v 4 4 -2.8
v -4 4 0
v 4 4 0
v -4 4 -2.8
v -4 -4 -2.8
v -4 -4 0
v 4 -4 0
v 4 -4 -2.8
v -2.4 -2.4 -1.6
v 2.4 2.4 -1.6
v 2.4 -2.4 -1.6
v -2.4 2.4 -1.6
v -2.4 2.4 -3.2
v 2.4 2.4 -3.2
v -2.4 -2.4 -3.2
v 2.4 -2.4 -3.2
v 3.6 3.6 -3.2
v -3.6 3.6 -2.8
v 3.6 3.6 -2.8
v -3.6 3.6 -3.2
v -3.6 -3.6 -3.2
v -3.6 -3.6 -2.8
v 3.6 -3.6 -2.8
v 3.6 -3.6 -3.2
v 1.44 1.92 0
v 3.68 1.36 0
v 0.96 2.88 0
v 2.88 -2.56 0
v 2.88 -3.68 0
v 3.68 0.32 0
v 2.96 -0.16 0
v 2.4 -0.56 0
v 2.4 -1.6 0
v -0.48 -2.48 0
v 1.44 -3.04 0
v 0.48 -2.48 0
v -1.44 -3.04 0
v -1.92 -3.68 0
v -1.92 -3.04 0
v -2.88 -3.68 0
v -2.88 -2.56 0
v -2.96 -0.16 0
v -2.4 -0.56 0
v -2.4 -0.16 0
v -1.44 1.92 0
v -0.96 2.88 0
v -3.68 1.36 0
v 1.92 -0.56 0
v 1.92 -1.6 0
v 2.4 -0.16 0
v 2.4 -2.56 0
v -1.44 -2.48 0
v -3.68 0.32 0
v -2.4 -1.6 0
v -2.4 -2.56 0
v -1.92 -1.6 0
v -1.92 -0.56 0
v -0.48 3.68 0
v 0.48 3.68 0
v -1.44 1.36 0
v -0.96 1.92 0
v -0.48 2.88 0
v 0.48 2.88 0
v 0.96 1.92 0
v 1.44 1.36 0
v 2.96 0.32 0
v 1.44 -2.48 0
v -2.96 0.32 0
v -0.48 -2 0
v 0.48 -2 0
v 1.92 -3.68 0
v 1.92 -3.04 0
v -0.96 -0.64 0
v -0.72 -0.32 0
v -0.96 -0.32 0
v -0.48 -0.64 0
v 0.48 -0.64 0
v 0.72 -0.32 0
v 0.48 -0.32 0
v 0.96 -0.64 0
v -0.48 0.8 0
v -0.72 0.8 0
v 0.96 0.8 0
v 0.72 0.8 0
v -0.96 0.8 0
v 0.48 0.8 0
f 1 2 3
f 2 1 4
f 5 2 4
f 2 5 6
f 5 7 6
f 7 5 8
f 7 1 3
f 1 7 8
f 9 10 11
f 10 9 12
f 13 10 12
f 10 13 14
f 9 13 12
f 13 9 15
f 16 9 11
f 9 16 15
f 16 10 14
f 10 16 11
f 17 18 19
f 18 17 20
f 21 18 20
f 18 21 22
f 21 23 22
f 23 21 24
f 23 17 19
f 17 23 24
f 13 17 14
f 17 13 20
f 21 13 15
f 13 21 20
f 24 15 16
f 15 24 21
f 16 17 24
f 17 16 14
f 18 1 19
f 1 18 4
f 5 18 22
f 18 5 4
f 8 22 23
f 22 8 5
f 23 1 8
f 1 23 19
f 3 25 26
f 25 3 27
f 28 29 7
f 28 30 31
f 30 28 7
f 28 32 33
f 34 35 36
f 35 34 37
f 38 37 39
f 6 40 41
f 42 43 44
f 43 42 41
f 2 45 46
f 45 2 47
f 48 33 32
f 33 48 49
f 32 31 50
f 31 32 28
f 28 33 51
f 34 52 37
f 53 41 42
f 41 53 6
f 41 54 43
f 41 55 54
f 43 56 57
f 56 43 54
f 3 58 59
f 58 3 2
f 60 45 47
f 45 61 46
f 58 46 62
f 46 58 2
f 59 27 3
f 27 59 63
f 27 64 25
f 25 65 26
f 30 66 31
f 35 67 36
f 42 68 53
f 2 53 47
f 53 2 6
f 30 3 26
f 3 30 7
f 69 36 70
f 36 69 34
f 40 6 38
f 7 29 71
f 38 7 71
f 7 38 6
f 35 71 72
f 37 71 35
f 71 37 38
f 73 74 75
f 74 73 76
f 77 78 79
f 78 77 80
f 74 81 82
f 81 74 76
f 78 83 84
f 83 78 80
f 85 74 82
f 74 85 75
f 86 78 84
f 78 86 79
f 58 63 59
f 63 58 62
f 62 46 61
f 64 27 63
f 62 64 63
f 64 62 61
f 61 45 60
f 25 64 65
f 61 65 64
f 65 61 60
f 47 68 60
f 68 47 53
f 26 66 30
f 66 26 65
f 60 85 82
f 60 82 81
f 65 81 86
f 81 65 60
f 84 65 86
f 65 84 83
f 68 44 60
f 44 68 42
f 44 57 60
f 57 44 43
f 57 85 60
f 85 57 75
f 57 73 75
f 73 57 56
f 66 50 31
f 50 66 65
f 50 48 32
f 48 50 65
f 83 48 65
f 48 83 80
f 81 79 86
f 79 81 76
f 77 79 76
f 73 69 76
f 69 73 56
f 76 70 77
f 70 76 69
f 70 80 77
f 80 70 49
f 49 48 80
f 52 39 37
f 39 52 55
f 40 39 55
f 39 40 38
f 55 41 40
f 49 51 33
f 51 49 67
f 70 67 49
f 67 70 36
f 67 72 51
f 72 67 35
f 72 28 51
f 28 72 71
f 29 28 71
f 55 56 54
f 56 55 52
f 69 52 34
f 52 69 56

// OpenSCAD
// file: ../p/box5.scad
use <../lib.scad>
function ldraw_lib__box5() = [
// 0 Box with 5 Faces and All Edges
// 0 Name: box5.dat
// 0 Author: James Jessiman
// 0 !LDRAW_ORG Primitive UPDATE 2012-01
// 0 !LICENSE Licensed under CC BY 4.0 : see CAreadme.txt
// 
// 0 BFC CERTIFY CCW
  [0,"BFC","CERTIFY"],
  [0,"BFC","CCW"],
// 
// 0 !HISTORY 2002-04-03 [sbliss] Modified for BFC compliance
// 0 !HISTORY 2002-04-25 [PTadmin] Official Update 2002-02
// 0 !HISTORY 2007-06-24 [PTadmin] Header formatted for Contributor Agreement
// 0 !HISTORY 2008-07-01 [PTadmin] Official Update 2008-01
// 0 !HISTORY 2012-02-16 [Philo] Changed to CCW
// 0 !HISTORY 2012-03-30 [PTadmin] Official Update 2012-01
// 
// 
// 2 24 1 1 1 -1 1 1
  [2,24,1,1,1,-1,1,1],
// 2 24 -1 1 1 -1 1 -1
  [2,24,-1,1,1,-1,1,-1],
// 2 24 -1 1 -1 1 1 -1
  [2,24,-1,1,-1,1,1,-1],
// 2 24 1 1 -1 1 1 1
  [2,24,1,1,-1,1,1,1],
// 2 24 1 0 1 -1 0 1
  [2,24,1,0,1,-1,0,1],
// 2 24 -1 0 1 -1 0 -1
  [2,24,-1,0,1,-1,0,-1],
// 2 24 -1 0 -1 1 0 -1
  [2,24,-1,0,-1,1,0,-1],
// 2 24 1 0 -1 1 0 1
  [2,24,1,0,-1,1,0,1],
// 2 24 1 0 1 1 1 1
  [2,24,1,0,1,1,1,1],
// 2 24 -1 0 1 -1 1 1
  [2,24,-1,0,1,-1,1,1],
// 2 24 1 0 -1 1 1 -1
  [2,24,1,0,-1,1,1,-1],
// 2 24 -1 0 -1 -1 1 -1
  [2,24,-1,0,-1,-1,1,-1],
// 4 16 -1 1 1 1 1 1 1 1 -1 -1 1 -1
  [4,16,-1,1,1,1,1,1,1,1,-1,-1,1,-1],
// 4 16 -1 1 1 -1 0 1 1 0 1 1 1 1
  [4,16,-1,1,1,-1,0,1,1,0,1,1,1,1],
// 4 16 -1 1 -1 -1 0 -1 -1 0 1 -1 1 1
  [4,16,-1,1,-1,-1,0,-1,-1,0,1,-1,1,1],
// 4 16 1 1 -1 1 0 -1 -1 0 -1 -1 1 -1
  [4,16,1,1,-1,1,0,-1,-1,0,-1,-1,1,-1],
// 4 16 1 1 1 1 0 1 1 0 -1 1 1 -1
  [4,16,1,1,1,1,0,1,1,0,-1,1,1,-1],
];
module ldraw_lib__box5(step=0, col=false, unit=2/5, alt=false, line=0.2, solid=!$preview)
    makepoly(ldraw_lib__box5(), step=step, col=col, unit=unit, alt=alt, line=line, solid=solid);
ldraw_lib__box5(line=0.2);
// file: ../p/box4.scad
use <../lib.scad>
function ldraw_lib__box4() = [
// 0 Box with 4 Faces (2 Parallel Pairs) and All Edges
// 0 Name: box4.dat
// 0 Author: James Jessiman
// 0 !LDRAW_ORG Primitive UPDATE 2012-01
// 0 !LICENSE Licensed under CC BY 4.0 : see CAreadme.txt
// 
// 0 BFC CERTIFY CCW
  [0,"BFC","CERTIFY"],
  [0,"BFC","CCW"],
// 
// 0 !HISTORY 2002-04-03 [sbliss] Modified for BFC compliance
// 0 !HISTORY 2002-04-25 [PTadmin] Official Update 2002-02
// 0 !HISTORY 2007-06-24 [PTadmin] Header formatted for Contributor Agreement
// 0 !HISTORY 2008-07-01 [PTadmin] Official Update 2008-01
// 0 !HISTORY 2012-02-16 [Philo] Changed to CCW
// 0 !HISTORY 2012-03-30 [PTadmin] Official Update 2012-01
// 
// 
// 2 24 1 1 1 -1 1 1
  [2,24,1,1,1,-1,1,1],
// 2 24 -1 1 1 -1 1 -1
  [2,24,-1,1,1,-1,1,-1],
// 2 24 -1 1 -1 1 1 -1
  [2,24,-1,1,-1,1,1,-1],
// 2 24 1 1 -1 1 1 1
  [2,24,1,1,-1,1,1,1],
// 2 24 1 0 1 -1 0 1
  [2,24,1,0,1,-1,0,1],
// 2 24 -1 0 1 -1 0 -1
  [2,24,-1,0,1,-1,0,-1],
// 2 24 -1 0 -1 1 0 -1
  [2,24,-1,0,-1,1,0,-1],
// 2 24 1 0 -1 1 0 1
  [2,24,1,0,-1,1,0,1],
// 2 24 1 0 1 1 1 1
  [2,24,1,0,1,1,1,1],
// 2 24 -1 0 1 -1 1 1
  [2,24,-1,0,1,-1,1,1],
// 2 24 1 0 -1 1 1 -1
  [2,24,1,0,-1,1,1,-1],
// 2 24 -1 0 -1 -1 1 -1
  [2,24,-1,0,-1,-1,1,-1],
// 4 16 -1 1 1 -1 0 1 1 0 1 1 1 1
  [4,16,-1,1,1,-1,0,1,1,0,1,1,1,1],
// 4 16 -1 1 -1 -1 0 -1 -1 0 1 -1 1 1
  [4,16,-1,1,-1,-1,0,-1,-1,0,1,-1,1,1],
// 4 16 1 1 -1 1 0 -1 -1 0 -1 -1 1 -1
  [4,16,1,1,-1,1,0,-1,-1,0,-1,-1,1,-1],
// 4 16 1 1 1 1 0 1 1 0 -1 1 1 -1
  [4,16,1,1,1,1,0,1,1,0,-1,1,1,-1],
];
module ldraw_lib__box4(step=0, col=false, unit=2/5, alt=false, line=0.2, solid=!$preview)
    makepoly(ldraw_lib__box4(), step=step, col=col, unit=unit, alt=alt, line=line, solid=solid);
ldraw_lib__box4(line=0.2);
// file: s/3070bs01.scad
use <../../lib.scad>
use <../../p/box4.scad>
use <../../p/box5.scad>
function ldraw_lib__s__3070bs01() = [
// 0 ~Tile  1 x  1 with Groove without Top Face
// 0 Name: s\3070bs01.dat
// 0 Author: Chris Dee [cwdee]
// 0 !LDRAW_ORG Subpart UPDATE 2009-02
// 0 !LICENSE Licensed under CC BY 4.0 : see CAreadme.txt
// 
// 0 BFC CERTIFY CCW
  [0,"BFC","CERTIFY"],
  [0,"BFC","CCW"],
// 
// 0 !HISTORY 2009-09-03 [PTadmin] Official Update 2009-02
// 
// 
// 1 16 0 0 0 10 0 0 0 7 0 0 0 10 box4.dat
  [1,16,0,0,0,10,0,0,0,7,0,0,0,10, ldraw_lib__box4()],
// 0 BFC INVERTNEXT
  [0,"BFC","INVERTNEXT"],
// 1 16 0 8 0 6 0 0 0 -4 0 0 0 6 box5.dat
  [1,16,0,8,0,6,0,0,0,-4,0,0,0,6, ldraw_lib__box5()],
// 1 16 0 7 0 9 0 0 0 1 0 0 0 9 box4.dat
  [1,16,0,7,0,9,0,0,0,1,0,0,0,9, ldraw_lib__box4()],
// 
// 4 16 9 8 9 6 8 6 -6 8 6 -9 8 9
  [4,16,9,8,9,6,8,6,-6,8,6,-9,8,9],
// 4 16 -9 8 9 -6 8 6 -6 8 -6 -9 8 -9
  [4,16,-9,8,9,-6,8,6,-6,8,-6,-9,8,-9],
// 4 16 -9 8 -9 -6 8 -6 6 8 -6 9 8 -9
  [4,16,-9,8,-9,-6,8,-6,6,8,-6,9,8,-9],
// 4 16 9 8 -9 6 8 -6 6 8 6 9 8 9
  [4,16,9,8,-9,6,8,-6,6,8,6,9,8,9],
// 
// 4 16 10 7 10 9 7 9 -9 7 9 -10 7 10
  [4,16,10,7,10,9,7,9,-9,7,9,-10,7,10],
// 4 16 -10 7 10 -9 7 9 -9 7 -9 -10 7 -10
  [4,16,-10,7,10,-9,7,9,-9,7,-9,-10,7,-10],
// 4 16 -10 7 -10 -9 7 -9 9 7 -9 10 7 -10
  [4,16,-10,7,-10,-9,7,-9,9,7,-9,10,7,-10],
// 4 16 10 7 -10 9 7 -9 9 7 9 10 7 10
  [4,16,10,7,-10,9,7,-9,9,7,9,10,7,10],
// 0
];
module ldraw_lib__s__3070bs01(step=0, col=false, unit=2/5, alt=false, line=0.2, solid=!$preview)
    makepoly(ldraw_lib__s__3070bs01(), step=step, col=col, unit=unit, alt=alt, line=line, solid=solid);
ldraw_lib__s__3070bs01(line=0.2);
// main file
use <../lib.scad>
use <s/3070bs01.scad>
function ldraw_lib__3070bp1m() = [
// 0 Tile  1 x  1 with Super Mario Pixelated Super Star Pattern
// 0 Name: 3070bp1m.dat
// 0 Author: Florent Faramond [Makou]
// 0 !LDRAW_ORG Part UPDATE 2025-10
// 0 !LICENSE Licensed under CC BY 4.0 : see CAreadme.txt
// 
// 0 BFC CERTIFY CCW
  [0,"BFC","CERTIFY"],
  [0,"BFC","CCW"],
// 
// 0 !KEYWORDS BrickLink 3070pb169, Rebrickable 3070bpr0230, Set 71374
// 
// 0 !HISTORY 2025-08-04 [Cheenzo] Removed unnecessary vertices and Bright Light Blue colour, reworked the triangulation
// 0 !HISTORY 2025-10-27 [OrionP] Official Update 2025-10
// 
// 1 16 0 0 0 1 0 0 0 1 0 0 0 1 s\3070bs01.dat
  [1,16,0,0,0,1,0,0,0,1,0,0,0,1, ldraw_lib__s__3070bs01()],
// 4 16 9.2 0 3.4 10 0 10 2.4 0 7.2 3.6 0 4.8
  [4,16,9.2,0,3.4,10,0,10,2.4,0,7.2,3.6,0,4.8],
// 3 16 7.2 0 -6.4 7.2 0 -9.2 10 0 -10
  [3,16,7.2,0,-6.4,7.2,0,-9.2,10,0,-10],
// 4 16 7.4 0 -.4 7.2 0 -6.4 10 0 -10 9.2 0 .8
  [4,16,7.4,0,-.4,7.2,0,-6.4,10,0,-10,9.2,0,.8],
// 3 16 7.2 0 -6.4 6 0 -1.4 6 0 -4
  [3,16,7.2,0,-6.4,6,0,-1.4,6,0,-4],
// 4 16 -3.6 0 -7.6 3.6 0 -7.6 1.2 0 -6.2 -1.2 0 -6.2
  [4,16,-3.6,0,-7.6,3.6,0,-7.6,1.2,0,-6.2,-1.2,0,-6.2],
// 3 16 -4.8 0 -9.2 -3.6 0 -7.6 -4.8 0 -7.6
  [3,16,-4.8,0,-9.2,-3.6,0,-7.6,-4.8,0,-7.6],
// 3 16 -10 0 -10 -7.2 0 -9.2 -7.2 0 -6.4
  [3,16,-10,0,-10,-7.2,0,-9.2,-7.2,0,-6.4],
// 4 16 -6 0 -.4 -7.4 0 -.4 -7.2 0 -6.4 -6 0 -1.4
  [4,16,-6,0,-.4,-7.4,0,-.4,-7.2,0,-6.4,-6,0,-1.4],
// 4 16 -2.4 0 7.2 -10 0 10 -9.2 0 3.4 -3.6 0 4.8
  [4,16,-2.4,0,7.2,-10,0,10,-9.2,0,3.4,-3.6,0,4.8],
// 4 16 6 0 -1.4 4.8 0 -1.4 4.8 0 -4 6 0 -4
  [4,16,6,0,-1.4,4.8,0,-1.4,4.8,0,-4,6,0,-4],
// 4 16 6 0 -.4 6 0 -1.4 7.2 0 -6.4 7.4 0 -.4
  [4,16,6,0,-.4,6,0,-1.4,7.2,0,-6.4,7.4,0,-.4],
// 3 16 7.2 0 -6.4 6 0 -4 6 0 -6.4
  [3,16,7.2,0,-6.4,6,0,-4,6,0,-6.4],
// 3 16 -1.2 0 -6.2 -3.6 0 -6.2 -3.6 0 -7.6
  [3,16,-1.2,0,-6.2,-3.6,0,-6.2,-3.6,0,-7.6],
// 4 16 -7.4 0 -.4 -9.2 0 .8 -10 0 -10 -7.2 0 -6.4
  [4,16,-7.4,0,-.4,-9.2,0,.8,-10,0,-10,-7.2,0,-6.4],
// 3 16 -7.2 0 -6.4 -6 0 -4 -6 0 -1.4
  [3,16,-7.2,0,-6.4,-6,0,-4,-6,0,-1.4],
// 3 16 -7.2 0 -6.4 -6 0 -6.4 -6 0 -4
  [3,16,-7.2,0,-6.4,-6,0,-6.4,-6,0,-4],
// 4 16 -4.8 0 -1.4 -6 0 -1.4 -6 0 -4 -4.8 0 -4
  [4,16,-4.8,0,-1.4,-6,0,-1.4,-6,0,-4,-4.8,0,-4],
// 4 16 -1.2 0 9.2 1.2 0 9.2 10 0 10 -10 0 10
  [4,16,-1.2,0,9.2,1.2,0,9.2,10,0,10,-10,0,10],
// 3 16 -3.6 0 3.4 -3.6 0 4.8 -9.2 0 3.4
  [3,16,-3.6,0,3.4,-3.6,0,4.8,-9.2,0,3.4],
// 3 16 -3.6 0 4.8 -2.4 0 4.8 -2.4 0 7.2
  [3,16,-3.6,0,4.8,-2.4,0,4.8,-2.4,0,7.2],
// 4 16 -10 0 10 -2.4 0 7.2 -1.2 0 7.2 -1.2 0 9.2
  [4,16,-10,0,10,-2.4,0,7.2,-1.2,0,7.2,-1.2,0,9.2],
// 4 16 10 0 10 1.2 0 9.2 1.2 0 7.2 2.4 0 7.2
  [4,16,10,0,10,1.2,0,9.2,1.2,0,7.2,2.4,0,7.2],
// 3 16 2.4 0 7.2 2.4 0 4.8 3.6 0 4.8
  [3,16,2.4,0,7.2,2.4,0,4.8,3.6,0,4.8],
// 3 16 3.6 0 4.8 3.6 0 3.4 9.2 0 3.4
  [3,16,3.6,0,4.8,3.6,0,3.4,9.2,0,3.4],
// 3 16 9.2 0 .8 7.4 0 .8 7.4 0 -.4
  [3,16,9.2,0,.8,7.4,0,.8,7.4,0,-.4],
// 3 16 3.6 0 -7.6 3.6 0 -6.2 1.2 0 -6.2
  [3,16,3.6,0,-7.6,3.6,0,-6.2,1.2,0,-6.2],
// 3 16 -7.4 0 -.4 -7.4 0 .8 -9.2 0 .8
  [3,16,-7.4,0,-.4,-7.4,0,.8,-9.2,0,.8],
// 4 16 -9.2 0 .8 -9.2 0 3.4 -10 0 10 -10 0 -10
  [4,16,-9.2,0,.8,-9.2,0,3.4,-10,0,10,-10,0,-10],
// 4 16 10 0 10 9.2 0 3.4 9.2 0 .8 10 0 -10
  [4,16,10,0,10,9.2,0,3.4,9.2,0,.8,10,0,-10],
// 4 16 -1.2 0 -5 -1.2 0 -6.2 1.2 0 -6.2 1.2 0 -5
  [4,16,-1.2,0,-5,-1.2,0,-6.2,1.2,0,-6.2,1.2,0,-5],
// 3 16 -7.2 0 -9.2 -10 0 -10 -4.8 0 -9.2
  [3,16,-7.2,0,-9.2,-10,0,-10,-4.8,0,-9.2],
// 3 16 10 0 -10 7.2 0 -9.2 4.8 0 -9.2
  [3,16,10,0,-10,7.2,0,-9.2,4.8,0,-9.2],
// 4 16 10 0 -10 4.8 0 -9.2 -4.8 0 -9.2 -10 0 -10
  [4,16,10,0,-10,4.8,0,-9.2,-4.8,0,-9.2,-10,0,-10],
// 3 16 3.6 0 -7.6 4.8 0 -9.2 4.8 0 -7.6
  [3,16,3.6,0,-7.6,4.8,0,-9.2,4.8,0,-7.6],
// 4 16 3.6 0 -7.6 -3.6 0 -7.6 -4.8 0 -9.2 4.8 0 -9.2
  [4,16,3.6,0,-7.6,-3.6,0,-7.6,-4.8,0,-9.2,4.8,0,-9.2],
// 4 4 -1.2 0 -1.6 -1.8 0 -.8 -2.4 0 -.8 -2.4 0 -1.6
  [4,4,-1.2,0,-1.6,-1.8,0,-.8,-2.4,0,-.8,-2.4,0,-1.6],
// 4 4 2.4 0 -1.6 1.8 0 -.8 1.2 0 -.8 1.2 0 -1.6
  [4,4,2.4,0,-1.6,1.8,0,-.8,1.2,0,-.8,1.2,0,-1.6],
// 4 4 -1.2 0 -1.6 -1.2 0 2 -1.8 0 2 -1.8 0 -.8
  [4,4,-1.2,0,-1.6,-1.2,0,2,-1.8,0,2,-1.8,0,-.8],
// 4 4 2.4 0 -1.6 2.4 0 2 1.8 0 2 1.8 0 -.8
  [4,4,2.4,0,-1.6,2.4,0,2,1.8,0,2,1.8,0,-.8],
// 4 320 -1.8 0 -.8 -1.8 0 2 -2.4 0 2 -2.4 0 -.8
  [4,320,-1.8,0,-.8,-1.8,0,2,-2.4,0,2,-2.4,0,-.8],
// 4 320 1.8 0 -.8 1.8 0 2 1.2 0 2 1.2 0 -.8
  [4,320,1.8,0,-.8,1.8,0,2,1.2,0,2,1.2,0,-.8],
// 4 78 -1.2 0 7.2 1.2 0 7.2 1.2 0 9.2 -1.2 0 9.2
  [4,78,-1.2,0,7.2,1.2,0,7.2,1.2,0,9.2,-1.2,0,9.2],
// 3 78 -1.2 0 7.2 -2.4 0 7.2 -2.4 0 4.8
  [3,78,-1.2,0,7.2,-2.4,0,7.2,-2.4,0,4.8],
// 3 78 2.4 0 4.8 2.4 0 7.2 1.2 0 7.2
  [3,78,2.4,0,4.8,2.4,0,7.2,1.2,0,7.2],
// 4 78 -1.2 0 7.2 -2.4 0 4.8 2.4 0 4.8 1.2 0 7.2
  [4,78,-1.2,0,7.2,-2.4,0,4.8,2.4,0,4.8,1.2,0,7.2],
// 3 78 -2.4 0 4.8 -3.6 0 4.8 -3.6 0 3.4
  [3,78,-2.4,0,4.8,-3.6,0,4.8,-3.6,0,3.4],
// 3 78 3.6 0 4.8 2.4 0 4.8 3.6 0 3.4
  [3,78,3.6,0,4.8,2.4,0,4.8,3.6,0,3.4],
// 4 78 3.6 0 3.4 2.4 0 4.8 -2.4 0 4.8 -3.6 0 3.4
  [4,78,3.6,0,3.4,2.4,0,4.8,-2.4,0,4.8,-3.6,0,3.4],
// 4 78 -3.6 0 3.4 -9.2 0 3.4 -9.2 0 .8 -7.4 0 .8
  [4,78,-3.6,0,3.4,-9.2,0,3.4,-9.2,0,.8,-7.4,0,.8],
// 4 78 7.4 0 .8 9.2 0 .8 9.2 0 3.4 3.6 0 3.4
  [4,78,7.4,0,.8,9.2,0,.8,9.2,0,3.4,3.6,0,3.4],
// 3 78 -3.6 0 3.4 -2.4 0 2 -1.8 0 2
  [3,78,-3.6,0,3.4,-2.4,0,2,-1.8,0,2],
// 3 78 -3.6 0 3.4 -1.8 0 2 -1.2 0 2
  [3,78,-3.6,0,3.4,-1.8,0,2,-1.2,0,2],
// 4 78 -1.2 0 2 1.2 0 2 3.6 0 3.4 -3.6 0 3.4
  [4,78,-1.2,0,2,1.2,0,2,3.6,0,3.4,-3.6,0,3.4],
// 3 78 1.8 0 2 3.6 0 3.4 1.2 0 2
  [3,78,1.8,0,2,3.6,0,3.4,1.2,0,2],
// 3 78 3.6 0 3.4 1.8 0 2 2.4 0 2
  [3,78,3.6,0,3.4,1.8,0,2,2.4,0,2],
// 4 78 -7.4 0 -.4 -6 0 -.4 -3.6 0 3.4 -7.4 0 .8
  [4,78,-7.4,0,-.4,-6,0,-.4,-3.6,0,3.4,-7.4,0,.8],
// 4 78 -4.8 0 -1.4 -3.6 0 3.4 -6 0 -.4 -6 0 -1.4
  [4,78,-4.8,0,-1.4,-3.6,0,3.4,-6,0,-.4,-6,0,-1.4],
// 4 78 -2.4 0 2 -3.6 0 3.4 -4.8 0 -1.4 -2.4 0 -.8
  [4,78,-2.4,0,2,-3.6,0,3.4,-4.8,0,-1.4,-2.4,0,-.8],
// 4 78 -2.4 0 -1.6 -2.4 0 -.8 -4.8 0 -1.4 -4.8 0 -4
  [4,78,-2.4,0,-1.6,-2.4,0,-.8,-4.8,0,-1.4,-4.8,0,-4],
// 4 78 6 0 -.4 7.4 0 -.4 7.4 0 .8 3.6 0 3.4
  [4,78,6,0,-.4,7.4,0,-.4,7.4,0,.8,3.6,0,3.4],
// 4 78 6 0 -1.4 6 0 -.4 3.6 0 3.4 4.8 0 -1.4
  [4,78,6,0,-1.4,6,0,-.4,3.6,0,3.4,4.8,0,-1.4],
// 4 78 4.8 0 -1.4 3.6 0 3.4 2.4 0 2 2.4 0 -1.6
  [4,78,4.8,0,-1.4,3.6,0,3.4,2.4,0,2,2.4,0,-1.6],
// 4 78 1.2 0 -.8 1.2 0 2 -1.2 0 2 -1.2 0 -1.6
  [4,78,1.2,0,-.8,1.2,0,2,-1.2,0,2,-1.2,0,-1.6],
// 3 78 1.2 0 -1.6 1.2 0 -.8 -1.2 0 -1.6
  [3,78,1.2,0,-1.6,1.2,0,-.8,-1.2,0,-1.6],
// 4 78 -1.2 0 -5 -1.2 0 -1.6 -2.4 0 -1.6 -4.8 0 -4
  [4,78,-1.2,0,-5,-1.2,0,-1.6,-2.4,0,-1.6,-4.8,0,-4],
// 4 78 1.2 0 -1.6 -1.2 0 -1.6 -1.2 0 -5 1.2 0 -5
  [4,78,1.2,0,-1.6,-1.2,0,-1.6,-1.2,0,-5,1.2,0,-5],
// 4 78 2.4 0 -1.6 1.2 0 -1.6 1.2 0 -5 4.8 0 -4
  [4,78,2.4,0,-1.6,1.2,0,-1.6,1.2,0,-5,4.8,0,-4],
// 3 78 4.8 0 -4 4.8 0 -1.4 2.4 0 -1.6
  [3,78,4.8,0,-4,4.8,0,-1.4,2.4,0,-1.6],
// 4 78 -4.8 0 -7.6 -3.6 0 -7.6 -3.6 0 -6.2 -6 0 -6.4
  [4,78,-4.8,0,-7.6,-3.6,0,-7.6,-3.6,0,-6.2,-6,0,-6.4],
// 4 78 -4.8 0 -9.2 -4.8 0 -7.6 -6 0 -6.4 -7.2 0 -9.2
  [4,78,-4.8,0,-9.2,-4.8,0,-7.6,-6,0,-6.4,-7.2,0,-9.2],
// 3 78 -6 0 -6.4 -7.2 0 -6.4 -7.2 0 -9.2
  [3,78,-6,0,-6.4,-7.2,0,-6.4,-7.2,0,-9.2],
// 4 78 6 0 -4 4.8 0 -4 3.6 0 -6.2 6 0 -6.4
  [4,78,6,0,-4,4.8,0,-4,3.6,0,-6.2,6,0,-6.4],
// 4 78 4.8 0 -4 1.2 0 -5 1.2 0 -6.2 3.6 0 -6.2
  [4,78,4.8,0,-4,1.2,0,-5,1.2,0,-6.2,3.6,0,-6.2],
// 4 78 4.8 0 -7.6 6 0 -6.4 3.6 0 -6.2 3.6 0 -7.6
  [4,78,4.8,0,-7.6,6,0,-6.4,3.6,0,-6.2,3.6,0,-7.6],
// 4 78 7.2 0 -6.4 6 0 -6.4 4.8 0 -7.6 4.8 0 -9.2
  [4,78,7.2,0,-6.4,6,0,-6.4,4.8,0,-7.6,4.8,0,-9.2],
// 3 78 7.2 0 -9.2 7.2 0 -6.4 4.8 0 -9.2
  [3,78,7.2,0,-9.2,7.2,0,-6.4,4.8,0,-9.2],
// 4 78 -6 0 -4 -6 0 -6.4 -3.6 0 -6.2 -4.8 0 -4
  [4,78,-6,0,-4,-6,0,-6.4,-3.6,0,-6.2,-4.8,0,-4],
// 4 78 -4.8 0 -4 -3.6 0 -6.2 -1.2 0 -6.2 -1.2 0 -5
  [4,78,-4.8,0,-4,-3.6,0,-6.2,-1.2,0,-6.2,-1.2,0,-5],
];
module ldraw_lib__3070bp1m(step=0, col=false, unit=2/5, alt=false, line=0.2, solid=!$preview)
    makepoly(ldraw_lib__3070bp1m(), step=step, col=col, unit=unit, alt=alt, line=line, solid=solid);
ldraw_lib__3070bp1m(line=0.2);
